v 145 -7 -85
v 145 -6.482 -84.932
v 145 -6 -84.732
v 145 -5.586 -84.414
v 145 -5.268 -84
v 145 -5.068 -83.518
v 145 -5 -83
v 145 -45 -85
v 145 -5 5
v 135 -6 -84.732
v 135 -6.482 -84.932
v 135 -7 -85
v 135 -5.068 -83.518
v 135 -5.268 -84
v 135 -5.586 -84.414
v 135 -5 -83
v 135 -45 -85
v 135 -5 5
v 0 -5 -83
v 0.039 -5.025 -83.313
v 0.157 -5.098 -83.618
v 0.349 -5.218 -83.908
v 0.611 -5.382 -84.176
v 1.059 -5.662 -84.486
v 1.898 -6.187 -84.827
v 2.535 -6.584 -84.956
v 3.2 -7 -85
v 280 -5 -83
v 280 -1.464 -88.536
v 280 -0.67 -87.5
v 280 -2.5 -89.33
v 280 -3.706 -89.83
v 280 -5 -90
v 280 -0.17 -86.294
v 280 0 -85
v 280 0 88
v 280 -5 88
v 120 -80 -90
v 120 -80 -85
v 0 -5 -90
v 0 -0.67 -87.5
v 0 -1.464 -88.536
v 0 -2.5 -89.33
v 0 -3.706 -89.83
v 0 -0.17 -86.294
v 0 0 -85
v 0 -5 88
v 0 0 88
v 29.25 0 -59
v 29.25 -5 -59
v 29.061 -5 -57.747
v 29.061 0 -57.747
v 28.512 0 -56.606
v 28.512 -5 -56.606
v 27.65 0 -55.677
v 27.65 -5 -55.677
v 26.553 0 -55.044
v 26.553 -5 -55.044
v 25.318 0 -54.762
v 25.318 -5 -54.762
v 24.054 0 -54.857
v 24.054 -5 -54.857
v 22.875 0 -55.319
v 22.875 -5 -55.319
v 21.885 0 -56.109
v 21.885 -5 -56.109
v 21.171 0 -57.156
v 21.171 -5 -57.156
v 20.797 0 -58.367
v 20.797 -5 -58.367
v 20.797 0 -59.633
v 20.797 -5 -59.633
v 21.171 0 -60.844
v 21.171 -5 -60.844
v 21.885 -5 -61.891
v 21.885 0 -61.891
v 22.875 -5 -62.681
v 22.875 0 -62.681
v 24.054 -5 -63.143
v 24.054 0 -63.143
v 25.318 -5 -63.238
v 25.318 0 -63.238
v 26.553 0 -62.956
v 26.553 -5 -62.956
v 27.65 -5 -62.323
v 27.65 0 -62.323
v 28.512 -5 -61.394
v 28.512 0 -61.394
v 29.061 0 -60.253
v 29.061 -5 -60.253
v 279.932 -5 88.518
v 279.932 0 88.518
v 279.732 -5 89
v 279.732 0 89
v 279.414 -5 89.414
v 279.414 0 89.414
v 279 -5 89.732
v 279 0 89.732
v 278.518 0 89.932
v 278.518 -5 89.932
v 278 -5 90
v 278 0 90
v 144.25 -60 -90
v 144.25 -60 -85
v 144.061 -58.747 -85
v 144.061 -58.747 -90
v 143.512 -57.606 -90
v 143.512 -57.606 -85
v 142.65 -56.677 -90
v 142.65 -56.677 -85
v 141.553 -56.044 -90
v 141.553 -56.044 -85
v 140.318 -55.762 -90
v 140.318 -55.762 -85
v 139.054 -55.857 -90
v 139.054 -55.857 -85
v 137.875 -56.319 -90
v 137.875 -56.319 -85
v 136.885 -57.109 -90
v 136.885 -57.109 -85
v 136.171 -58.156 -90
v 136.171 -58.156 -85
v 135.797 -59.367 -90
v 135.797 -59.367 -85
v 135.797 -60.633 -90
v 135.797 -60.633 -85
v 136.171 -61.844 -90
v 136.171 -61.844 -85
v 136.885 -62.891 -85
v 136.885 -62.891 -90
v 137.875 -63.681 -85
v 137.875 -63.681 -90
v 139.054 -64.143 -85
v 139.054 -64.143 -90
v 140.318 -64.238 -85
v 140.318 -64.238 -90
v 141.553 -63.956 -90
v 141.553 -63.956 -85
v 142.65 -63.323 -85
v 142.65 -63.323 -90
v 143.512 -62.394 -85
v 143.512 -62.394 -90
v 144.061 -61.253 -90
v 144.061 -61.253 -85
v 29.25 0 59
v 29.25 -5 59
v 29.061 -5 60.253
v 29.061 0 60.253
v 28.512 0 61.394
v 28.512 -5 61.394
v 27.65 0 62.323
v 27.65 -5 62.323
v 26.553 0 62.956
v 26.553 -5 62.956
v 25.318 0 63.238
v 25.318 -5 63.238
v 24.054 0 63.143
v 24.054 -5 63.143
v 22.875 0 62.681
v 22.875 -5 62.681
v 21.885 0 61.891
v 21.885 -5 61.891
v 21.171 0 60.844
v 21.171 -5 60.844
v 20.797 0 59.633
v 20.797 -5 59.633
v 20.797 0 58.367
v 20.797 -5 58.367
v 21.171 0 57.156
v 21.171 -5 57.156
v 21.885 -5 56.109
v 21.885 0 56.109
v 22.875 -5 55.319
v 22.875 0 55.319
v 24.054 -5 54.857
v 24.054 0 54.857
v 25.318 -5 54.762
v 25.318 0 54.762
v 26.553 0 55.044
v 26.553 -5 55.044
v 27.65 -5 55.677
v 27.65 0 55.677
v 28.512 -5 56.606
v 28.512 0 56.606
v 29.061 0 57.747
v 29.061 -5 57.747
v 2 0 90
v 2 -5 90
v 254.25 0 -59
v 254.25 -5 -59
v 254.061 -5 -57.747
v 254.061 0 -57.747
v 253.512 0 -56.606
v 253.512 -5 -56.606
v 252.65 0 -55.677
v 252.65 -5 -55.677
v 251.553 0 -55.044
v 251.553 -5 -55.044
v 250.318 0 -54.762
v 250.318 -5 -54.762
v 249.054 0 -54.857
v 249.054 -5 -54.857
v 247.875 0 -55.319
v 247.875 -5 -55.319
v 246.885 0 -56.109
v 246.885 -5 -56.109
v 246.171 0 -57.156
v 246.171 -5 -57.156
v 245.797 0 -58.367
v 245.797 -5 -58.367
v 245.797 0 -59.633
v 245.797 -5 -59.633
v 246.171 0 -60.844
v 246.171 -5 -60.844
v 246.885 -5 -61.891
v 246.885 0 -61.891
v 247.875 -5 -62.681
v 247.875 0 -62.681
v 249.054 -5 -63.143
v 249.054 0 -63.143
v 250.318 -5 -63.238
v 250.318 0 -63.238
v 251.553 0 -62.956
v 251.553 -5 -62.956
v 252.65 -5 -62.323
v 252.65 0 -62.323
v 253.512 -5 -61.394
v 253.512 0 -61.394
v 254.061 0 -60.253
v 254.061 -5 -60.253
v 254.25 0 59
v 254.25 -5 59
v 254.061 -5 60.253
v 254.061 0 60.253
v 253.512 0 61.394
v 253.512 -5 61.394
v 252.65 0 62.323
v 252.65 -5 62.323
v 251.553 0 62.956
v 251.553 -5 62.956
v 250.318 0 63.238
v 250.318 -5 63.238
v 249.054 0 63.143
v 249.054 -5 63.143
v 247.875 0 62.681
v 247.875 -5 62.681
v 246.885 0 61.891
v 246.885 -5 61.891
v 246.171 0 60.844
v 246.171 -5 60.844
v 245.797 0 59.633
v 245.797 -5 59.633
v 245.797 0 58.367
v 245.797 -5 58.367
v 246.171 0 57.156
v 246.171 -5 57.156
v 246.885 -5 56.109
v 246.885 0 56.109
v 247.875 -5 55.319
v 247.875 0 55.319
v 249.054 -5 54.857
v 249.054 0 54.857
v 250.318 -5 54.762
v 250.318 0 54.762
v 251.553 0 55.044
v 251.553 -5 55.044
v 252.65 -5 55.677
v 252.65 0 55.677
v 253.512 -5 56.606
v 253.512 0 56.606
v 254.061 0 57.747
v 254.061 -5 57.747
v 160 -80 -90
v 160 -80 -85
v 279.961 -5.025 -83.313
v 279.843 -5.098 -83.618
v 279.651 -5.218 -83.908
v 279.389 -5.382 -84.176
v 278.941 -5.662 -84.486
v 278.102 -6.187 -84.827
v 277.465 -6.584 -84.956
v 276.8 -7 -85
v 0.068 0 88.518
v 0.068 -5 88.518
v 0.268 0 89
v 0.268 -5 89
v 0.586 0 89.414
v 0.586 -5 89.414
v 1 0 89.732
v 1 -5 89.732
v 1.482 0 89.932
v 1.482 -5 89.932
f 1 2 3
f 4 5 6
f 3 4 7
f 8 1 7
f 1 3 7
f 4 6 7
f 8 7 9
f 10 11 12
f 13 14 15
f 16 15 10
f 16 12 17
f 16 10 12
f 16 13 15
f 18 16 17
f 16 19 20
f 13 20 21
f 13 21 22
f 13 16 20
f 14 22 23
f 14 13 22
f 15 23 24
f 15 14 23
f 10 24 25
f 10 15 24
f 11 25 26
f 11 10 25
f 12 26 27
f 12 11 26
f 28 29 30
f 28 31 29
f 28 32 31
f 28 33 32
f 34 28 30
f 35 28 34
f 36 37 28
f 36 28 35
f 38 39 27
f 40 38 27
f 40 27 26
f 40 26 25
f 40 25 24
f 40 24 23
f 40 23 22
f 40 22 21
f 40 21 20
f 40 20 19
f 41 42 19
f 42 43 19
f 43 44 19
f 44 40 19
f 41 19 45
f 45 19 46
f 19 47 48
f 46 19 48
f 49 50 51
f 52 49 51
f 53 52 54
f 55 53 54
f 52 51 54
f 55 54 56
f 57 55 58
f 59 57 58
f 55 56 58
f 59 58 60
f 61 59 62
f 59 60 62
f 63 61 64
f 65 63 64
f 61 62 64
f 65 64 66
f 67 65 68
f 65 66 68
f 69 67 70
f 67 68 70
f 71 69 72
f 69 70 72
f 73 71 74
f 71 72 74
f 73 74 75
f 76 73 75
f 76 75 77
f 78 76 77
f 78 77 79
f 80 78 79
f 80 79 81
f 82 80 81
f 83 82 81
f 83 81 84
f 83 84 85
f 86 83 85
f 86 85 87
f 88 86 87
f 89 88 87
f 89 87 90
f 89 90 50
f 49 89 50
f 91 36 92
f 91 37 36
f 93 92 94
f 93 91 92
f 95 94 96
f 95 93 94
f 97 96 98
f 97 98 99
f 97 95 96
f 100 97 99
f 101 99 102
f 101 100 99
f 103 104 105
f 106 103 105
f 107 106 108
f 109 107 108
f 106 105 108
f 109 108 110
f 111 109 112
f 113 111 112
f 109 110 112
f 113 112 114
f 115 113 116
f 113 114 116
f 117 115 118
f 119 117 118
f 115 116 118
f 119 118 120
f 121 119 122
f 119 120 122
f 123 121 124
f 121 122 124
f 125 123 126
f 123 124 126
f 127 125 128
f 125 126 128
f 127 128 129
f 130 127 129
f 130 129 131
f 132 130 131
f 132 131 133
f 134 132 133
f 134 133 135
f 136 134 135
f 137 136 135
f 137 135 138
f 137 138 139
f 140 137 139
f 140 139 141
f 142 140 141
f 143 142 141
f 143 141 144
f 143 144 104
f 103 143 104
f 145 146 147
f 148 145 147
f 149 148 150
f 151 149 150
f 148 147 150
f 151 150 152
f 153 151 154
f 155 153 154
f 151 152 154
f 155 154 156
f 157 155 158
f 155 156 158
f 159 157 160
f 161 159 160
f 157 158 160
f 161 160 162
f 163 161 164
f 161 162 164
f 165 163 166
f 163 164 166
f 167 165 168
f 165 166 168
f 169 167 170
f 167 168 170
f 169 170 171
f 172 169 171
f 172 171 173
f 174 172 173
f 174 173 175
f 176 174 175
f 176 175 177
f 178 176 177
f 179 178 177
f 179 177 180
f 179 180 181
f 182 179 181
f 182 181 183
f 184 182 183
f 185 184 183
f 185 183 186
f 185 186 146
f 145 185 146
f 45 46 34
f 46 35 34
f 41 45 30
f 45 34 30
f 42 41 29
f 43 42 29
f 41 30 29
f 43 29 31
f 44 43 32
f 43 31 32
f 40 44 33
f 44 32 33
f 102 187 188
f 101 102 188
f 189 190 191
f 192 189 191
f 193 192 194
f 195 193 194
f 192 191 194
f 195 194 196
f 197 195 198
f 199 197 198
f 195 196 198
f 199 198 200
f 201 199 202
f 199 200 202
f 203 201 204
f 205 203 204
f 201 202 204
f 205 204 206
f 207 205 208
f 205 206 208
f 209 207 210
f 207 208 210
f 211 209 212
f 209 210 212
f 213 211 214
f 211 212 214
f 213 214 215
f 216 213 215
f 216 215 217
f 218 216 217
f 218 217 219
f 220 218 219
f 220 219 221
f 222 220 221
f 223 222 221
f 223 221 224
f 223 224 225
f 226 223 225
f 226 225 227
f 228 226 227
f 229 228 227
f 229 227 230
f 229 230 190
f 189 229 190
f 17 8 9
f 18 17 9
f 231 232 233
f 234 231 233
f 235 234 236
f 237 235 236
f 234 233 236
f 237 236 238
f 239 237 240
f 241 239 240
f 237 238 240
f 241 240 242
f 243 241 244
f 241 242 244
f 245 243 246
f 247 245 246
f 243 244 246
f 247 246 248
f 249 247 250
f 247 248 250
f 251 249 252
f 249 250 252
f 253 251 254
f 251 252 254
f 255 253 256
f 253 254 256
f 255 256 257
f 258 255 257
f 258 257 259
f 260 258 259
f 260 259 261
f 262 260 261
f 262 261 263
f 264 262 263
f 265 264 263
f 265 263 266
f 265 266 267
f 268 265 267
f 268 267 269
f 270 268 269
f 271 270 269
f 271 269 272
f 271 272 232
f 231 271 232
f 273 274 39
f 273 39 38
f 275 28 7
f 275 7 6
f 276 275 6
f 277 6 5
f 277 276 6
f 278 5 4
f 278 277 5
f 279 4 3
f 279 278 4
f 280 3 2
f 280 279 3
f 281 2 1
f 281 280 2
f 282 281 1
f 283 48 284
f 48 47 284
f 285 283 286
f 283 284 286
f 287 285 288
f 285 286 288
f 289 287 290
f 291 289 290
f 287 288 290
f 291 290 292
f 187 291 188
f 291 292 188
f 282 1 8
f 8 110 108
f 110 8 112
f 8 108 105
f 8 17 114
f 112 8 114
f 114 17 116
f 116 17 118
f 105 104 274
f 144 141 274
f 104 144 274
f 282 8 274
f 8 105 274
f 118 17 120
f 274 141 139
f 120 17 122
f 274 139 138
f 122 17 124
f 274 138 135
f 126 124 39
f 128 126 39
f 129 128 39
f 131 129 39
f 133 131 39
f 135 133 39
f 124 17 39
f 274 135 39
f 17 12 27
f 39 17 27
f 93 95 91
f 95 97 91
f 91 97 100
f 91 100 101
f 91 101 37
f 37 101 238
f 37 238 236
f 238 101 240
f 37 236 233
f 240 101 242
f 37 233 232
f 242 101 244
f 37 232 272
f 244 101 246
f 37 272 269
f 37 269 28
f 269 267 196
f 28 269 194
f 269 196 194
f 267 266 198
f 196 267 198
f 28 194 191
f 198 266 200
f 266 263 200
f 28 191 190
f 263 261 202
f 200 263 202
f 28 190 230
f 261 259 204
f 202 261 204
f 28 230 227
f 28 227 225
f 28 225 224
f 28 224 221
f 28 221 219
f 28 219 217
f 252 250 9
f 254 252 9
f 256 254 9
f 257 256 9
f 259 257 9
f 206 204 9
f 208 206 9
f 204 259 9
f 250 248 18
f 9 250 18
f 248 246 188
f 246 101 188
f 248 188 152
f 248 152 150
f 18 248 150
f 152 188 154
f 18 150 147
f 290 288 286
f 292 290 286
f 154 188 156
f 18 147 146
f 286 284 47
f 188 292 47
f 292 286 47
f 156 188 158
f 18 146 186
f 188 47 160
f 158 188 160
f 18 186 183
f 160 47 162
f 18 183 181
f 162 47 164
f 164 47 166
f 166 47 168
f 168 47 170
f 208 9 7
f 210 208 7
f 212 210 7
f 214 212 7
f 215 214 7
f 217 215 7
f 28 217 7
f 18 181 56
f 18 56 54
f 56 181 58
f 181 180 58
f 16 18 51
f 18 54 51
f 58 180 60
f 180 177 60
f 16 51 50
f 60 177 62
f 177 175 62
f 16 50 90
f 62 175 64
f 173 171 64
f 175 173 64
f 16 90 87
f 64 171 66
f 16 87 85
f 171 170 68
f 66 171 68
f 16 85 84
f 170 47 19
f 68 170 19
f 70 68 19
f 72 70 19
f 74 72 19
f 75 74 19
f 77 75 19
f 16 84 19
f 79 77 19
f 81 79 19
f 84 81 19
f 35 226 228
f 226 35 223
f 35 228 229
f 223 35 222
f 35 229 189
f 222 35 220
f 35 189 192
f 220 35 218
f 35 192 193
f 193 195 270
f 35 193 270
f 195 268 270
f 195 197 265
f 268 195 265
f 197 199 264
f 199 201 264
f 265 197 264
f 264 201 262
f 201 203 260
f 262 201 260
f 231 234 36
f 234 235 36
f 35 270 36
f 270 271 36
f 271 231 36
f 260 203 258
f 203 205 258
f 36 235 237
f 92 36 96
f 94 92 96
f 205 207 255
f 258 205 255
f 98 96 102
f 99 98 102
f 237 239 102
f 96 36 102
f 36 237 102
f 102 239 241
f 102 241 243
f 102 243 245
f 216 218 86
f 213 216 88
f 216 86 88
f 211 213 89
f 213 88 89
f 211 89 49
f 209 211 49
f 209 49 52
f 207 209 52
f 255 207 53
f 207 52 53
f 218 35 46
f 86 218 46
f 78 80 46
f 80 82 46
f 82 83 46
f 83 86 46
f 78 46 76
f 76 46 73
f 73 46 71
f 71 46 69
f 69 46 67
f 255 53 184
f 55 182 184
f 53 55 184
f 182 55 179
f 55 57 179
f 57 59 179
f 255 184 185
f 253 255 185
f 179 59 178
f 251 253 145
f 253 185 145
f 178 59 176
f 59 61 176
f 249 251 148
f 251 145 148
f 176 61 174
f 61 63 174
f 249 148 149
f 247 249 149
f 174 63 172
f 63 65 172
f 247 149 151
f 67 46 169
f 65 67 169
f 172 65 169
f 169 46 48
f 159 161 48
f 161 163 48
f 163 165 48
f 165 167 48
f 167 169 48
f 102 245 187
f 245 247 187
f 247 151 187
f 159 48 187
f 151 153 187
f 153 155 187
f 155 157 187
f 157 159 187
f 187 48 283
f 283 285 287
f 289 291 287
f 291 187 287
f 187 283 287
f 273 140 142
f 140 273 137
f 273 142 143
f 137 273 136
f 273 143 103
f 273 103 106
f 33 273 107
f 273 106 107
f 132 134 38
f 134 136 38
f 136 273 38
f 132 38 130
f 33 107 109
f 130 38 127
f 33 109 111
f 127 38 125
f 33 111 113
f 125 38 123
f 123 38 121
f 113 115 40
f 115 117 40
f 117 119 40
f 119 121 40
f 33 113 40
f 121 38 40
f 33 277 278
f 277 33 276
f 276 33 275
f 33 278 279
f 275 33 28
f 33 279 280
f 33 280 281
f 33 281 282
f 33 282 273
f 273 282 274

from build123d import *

# Parameters (mm, degrees)
F1_DEPTH  = 280
F2_R      = 4.25
F3_DEPTH  = 5.001
F4_R      = 2
F5_R      = 4.25
F6_DEPTH  = 5.001
F7_R      = 5
F8_W      = 10
F8_H      = 90
F9_DEPTH  = 40
F11_DEPTH = 145.001
F13_DEPTH = 5.001
F14_R     = 2


with BuildPart() as f1:
    # F0 (on Right) → F1 (new body)
    with BuildSketch(Plane.YZ):
        Polygon((0, -90), (0, 90), (-5, 90), (-5, -85), (-80, -85), (-80, -90), align=None)
    extrude(amount=F1_DEPTH)

    # F2 (on face) → F3 (cut, through all)
    with BuildSketch(Plane.XZ.offset(5)):
        with Locations((25, 59)):
            Circle(F2_R)
        with Locations((25, -59)):
            Circle(F2_R)
        with Locations((250, -59)):
            Circle(F2_R)
        with Locations((250, 59)):
            Circle(F2_R)
    extrude(amount=-F3_DEPTH, mode=Mode.SUBTRACT)

    # F4
    f4_edges = [f1.edges().sort_by_distance(p)[0] for p in [
        (0, -2.5, 90),
        (280, -2.5, 90),
        (280, -80, -87.5),
        (0, -80, -87.5),
    ]]
    fillet(f4_edges, radius=F4_R)

    # F5 (on face) → F6 (cut, through all)
    with BuildSketch(Plane.XY.offset(-85)):
        with Locations((140, -60)):
            Circle(F5_R)
    extrude(amount=-F6_DEPTH, mode=Mode.SUBTRACT)

    # F7
    f7_edges = [f1.edges().sort_by_distance(p)[0] for p in [
        (140, 0, -90),
    ]]
    fillet(f7_edges, radius=F7_R)

    # F8 (on face) → F9 (join)
    with BuildSketch(Plane.XZ.offset(5)):
        with Locations((140, -40)):
            Rectangle(F8_W, F8_H)
    extrude(amount=F9_DEPTH)

    # F10 (on face) → F11 (cut, through all)
    with BuildSketch(Plane.YZ.offset(145)):
        Polygon((-45, -85), (-5, 5), (-45, 5), align=None)
    extrude(amount=-F11_DEPTH, mode=Mode.SUBTRACT)

    # F12 (on face) → F13 (cut, through all)
    with BuildSketch(Plane.XY.offset(-85)):
        with BuildLine():
            Line((2, -80), (120, -80))
            Line((120, -80), (0, -5))
            Line((0, -5), (0, -78))
            ThreePointArc((0, -78), (0.5857864376, -79.4142135624), (2, -80))
        make_face()
        with BuildLine():
            Line((280, -78), (280, -5))
            Line((280, -5), (160, -80))
            Line((160, -80), (278, -80))
            ThreePointArc((278, -80), (279.4142135624, -79.4142135624), (280, -78))
        make_face()
    extrude(amount=-F13_DEPTH, mode=Mode.SUBTRACT)

    # F14
    f14_edges = [f1.edges().sort_by_distance(p)[0] for p in [
        (67.5, -5, -85),
        (212.5, -5, -85),
    ]]
    fillet(f14_edges, radius=F14_R)


solid = f1.part
